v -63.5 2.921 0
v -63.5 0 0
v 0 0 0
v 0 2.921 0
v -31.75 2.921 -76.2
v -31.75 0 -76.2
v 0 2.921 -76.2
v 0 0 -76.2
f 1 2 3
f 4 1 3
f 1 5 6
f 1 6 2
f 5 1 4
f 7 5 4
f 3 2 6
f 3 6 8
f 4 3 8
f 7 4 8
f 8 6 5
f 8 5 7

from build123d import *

# Parameters (mm, degrees)
SKETCH1_W           = 304.8
SKETCH1_H           = 76.2
BOSS_EXTRUDE1_DEPTH = 3.175
CUT_EXTRUDE3_DEPTH  = 0.254
CUT_EXTRUDE5_DEPTH  = 0.254
SKETCH3_3_OUTSIDE_W = 369.64
SKETCH3_3_OUTSIDE_H = 141.04
CUT_EXTRUDE9_DEPTH  = 315.196691105


with BuildPart() as part:
    # Sketch1 → Boss-Extrude1 (new body)
    with BuildSketch(Plane(origin=(0, 0, 0), x_dir=(1, 0, 0), z_dir=(0, 1, 0))):
        with Locations((-152.4, 38.1)):
            Rectangle(SKETCH1_W, SKETCH1_H)
    extrude(amount=BOSS_EXTRUDE1_DEPTH)

    # Sketch2 → Cut-Extrude3 (cut)
    with BuildSketch(Plane(origin=(0, 3.175, 0), x_dir=(1, 0, 0), z_dir=(0, 1, 0))):
        with BuildLine():
            Line((-304.8, 5.132354223), (-304.8, 0.390438323))
            add(Edge.make_bspline(
                [(-304.8, 0.390438323), (-303.821243343, 0.22923291), (-302.632591032, 0.100235841), (-301.136713645, 0)],
                knots=[0.767987957, 0.767987957, 0.767987957, 0.767987957, 1, 1, 1, 1], degree=3))
            Line((-301.136713645, 0), (-217.379871236, 0))
            add(Edge.make_bspline(
                [(-215.9, 0.210253502), (-216.602591478, 0.075926224), (-217.379871236, 0)],
                knots=[0.882956558, 0.882956558, 0.882956558, 1, 1, 1], degree=2))
            Line((-215.9, 0.210253502), (-215.9, 6.35))
            add(Edge.make_bspline(
                [(-304.8, 5.132354223), (-295.056068779, 7.913424716), (-284.63514545, 9.175759011), (-256.65451685, 7.910717471), (-231.983718042, 8.039058457), (-215.9, 6.35)],
                knots=[0.033341876, 0.033341876, 0.033341876, 0.033341876, 0.196819423, 0.285044024, 0.915587883, 0.915587883, 0.915587883, 0.915587883], degree=3))
        make_face()
        with BuildLine():
            Line((-304.748193138, 14.319973849), (-304.748193138, 9.578057948))
            add(Edge.make_bspline(
                [(-304.748193138, 9.578057948), (-303.76943648, 9.416852535), (-302.58078417, 9.287855466), (-301.084906782, 9.187619625)],
                knots=[0.767987957, 0.767987957, 0.767987957, 0.767987957, 1, 1, 1, 1], degree=3))
            Line((-301.084906782, 9.187619625), (-217.328064374, 9.187619625))
            add(Edge.make_bspline(
                [(-215.848193138, 9.397873128), (-216.550784616, 9.263545849), (-217.328064374, 9.187619625)],
                knots=[0.882956558, 0.882956558, 0.882956558, 1, 1, 1], degree=2))
            Line((-215.848193138, 9.397873128), (-215.848193138, 15.537619625))
            add(Edge.make_bspline(
                [(-304.748193138, 14.319973849), (-295.004261916, 17.101044341), (-284.583338588, 18.363378636), (-256.602709988, 17.098337097), (-231.93191118, 17.226678082), (-215.848193138, 15.537619625)],
                knots=[0.033341876, 0.033341876, 0.033341876, 0.033341876, 0.196819423, 0.285044024, 0.915587883, 0.915587883, 0.915587883, 0.915587883], degree=3))
        make_face()
        with BuildLine():
            Line((-304.77561062, 23.435546339), (-304.77561062, 18.693630439))
            add(Edge.make_bspline(
                [(-304.77561062, 18.693630439), (-303.796853962, 18.532425025), (-302.608201652, 18.403427957), (-301.112324264, 18.303192116)],
                knots=[0.767987957, 0.767987957, 0.767987957, 0.767987957, 1, 1, 1, 1], degree=3))
            Line((-301.112324264, 18.303192116), (-217.355481855, 18.303192116))
            add(Edge.make_bspline(
                [(-215.87561062, 18.513445618), (-216.578202097, 18.37911834), (-217.355481855, 18.303192116)],
                knots=[0.882956558, 0.882956558, 0.882956558, 1, 1, 1], degree=2))
            Line((-215.87561062, 18.513445618), (-215.87561062, 24.653192116))
            add(Edge.make_bspline(
                [(-304.77561062, 23.435546339), (-295.031679398, 26.216616832), (-284.61075607, 27.478951126), (-256.63012747, 26.213909587), (-231.959328661, 26.342250572), (-215.87561062, 24.653192116)],
                knots=[0.033341876, 0.033341876, 0.033341876, 0.033341876, 0.196819423, 0.285044024, 0.915587883, 0.915587883, 0.915587883, 0.915587883], degree=3))
        make_face()
        with BuildLine():
            Line((-304.723803757, 32.623165964), (-304.723803757, 27.881250064))
            add(Edge.make_bspline(
                [(-304.723803757, 27.881250064), (-303.7450471, 27.720044651), (-302.55639479, 27.591047582), (-301.060517402, 27.490811741)],
                knots=[0.767987957, 0.767987957, 0.767987957, 0.767987957, 1, 1, 1, 1], degree=3))
            Line((-301.060517402, 27.490811741), (-217.303674993, 27.490811741))
            add(Edge.make_bspline(
                [(-215.823803757, 27.701065244), (-216.526395235, 27.566737965), (-217.303674993, 27.490811741)],
                knots=[0.882956558, 0.882956558, 0.882956558, 1, 1, 1], degree=2))
            Line((-215.823803757, 27.701065244), (-215.823803757, 33.840811741))
            add(Edge.make_bspline(
                [(-304.723803757, 32.623165964), (-294.979872536, 35.404236457), (-284.558949208, 36.666570752), (-256.578320608, 35.401529213), (-231.907521799, 35.529870198), (-215.823803757, 33.840811741)],
                knots=[0.033341876, 0.033341876, 0.033341876, 0.033341876, 0.196819423, 0.285044024, 0.915587883, 0.915587883, 0.915587883, 0.915587883], degree=3))
        make_face()
        with BuildLine():
            Line((-304.692120731, 41.752034592), (-304.692120731, 37.010118692))
            add(Edge.make_bspline(
                [(-304.692120731, 37.010118692), (-303.713364073, 36.848913278), (-302.524711763, 36.71991621), (-301.028834375, 36.619680369)],
                knots=[0.767987957, 0.767987957, 0.767987957, 0.767987957, 1, 1, 1, 1], degree=3))
            Line((-301.028834375, 36.619680369), (-217.271991966, 36.619680369))
            add(Edge.make_bspline(
                [(-215.792120731, 36.829933871), (-216.494712209, 36.695606593), (-217.271991966, 36.619680369)],
                knots=[0.882956558, 0.882956558, 0.882956558, 1, 1, 1], degree=2))
            Line((-215.792120731, 36.829933871), (-215.792120731, 42.969680369))
            add(Edge.make_bspline(
                [(-304.692120731, 41.752034592), (-294.948189509, 44.533105085), (-284.527266181, 45.795439379), (-256.546637581, 44.53039784), (-231.875838773, 44.658738825), (-215.792120731, 42.969680369)],
                knots=[0.033341876, 0.033341876, 0.033341876, 0.033341876, 0.196819423, 0.285044024, 0.915587883, 0.915587883, 0.915587883, 0.915587883], degree=3))
        make_face()
        with BuildLine():
            Line((-304.640313869, 50.939654217), (-304.640313869, 46.197738317))
            add(Edge.make_bspline(
                [(-304.640313869, 46.197738317), (-303.661557211, 46.036532904), (-302.472904901, 45.907535835), (-300.977027513, 45.807299994)],
                knots=[0.767987957, 0.767987957, 0.767987957, 0.767987957, 1, 1, 1, 1], degree=3))
            Line((-300.977027513, 45.807299994), (-217.220185104, 45.807299994))
            add(Edge.make_bspline(
                [(-215.740313869, 46.017553497), (-216.442905346, 45.883226218), (-217.220185104, 45.807299994)],
                knots=[0.882956558, 0.882956558, 0.882956558, 1, 1, 1], degree=2))
            Line((-215.740313869, 46.017553497), (-215.740313869, 52.157299994))
            add(Edge.make_bspline(
                [(-304.640313869, 50.939654217), (-294.896382647, 53.72072471), (-284.475459319, 54.983059005), (-256.494830719, 53.718017466), (-231.82403191, 53.846358451), (-215.740313869, 52.157299994)],
                knots=[0.033341876, 0.033341876, 0.033341876, 0.033341876, 0.196819423, 0.285044024, 0.915587883, 0.915587883, 0.915587883, 0.915587883], degree=3))
        make_face()
        with BuildLine():
            Line((-304.66773135, 60.055226708), (-304.66773135, 55.313310807))
            add(Edge.make_bspline(
                [(-304.66773135, 55.313310807), (-303.688974693, 55.152105394), (-302.500322383, 55.023108326), (-301.004444995, 54.922872485)],
                knots=[0.767987957, 0.767987957, 0.767987957, 0.767987957, 1, 1, 1, 1], degree=3))
            Line((-301.004444995, 54.922872485), (-217.247602586, 54.922872485))
            add(Edge.make_bspline(
                [(-215.76773135, 55.133125987), (-216.470322828, 54.998798708), (-217.247602586, 54.922872485)],
                knots=[0.882956558, 0.882956558, 0.882956558, 1, 1, 1], degree=2))
            Line((-215.76773135, 55.133125987), (-215.76773135, 61.272872485))
            add(Edge.make_bspline(
                [(-304.66773135, 60.055226708), (-294.923800129, 62.836297201), (-284.502876801, 64.098631495), (-256.522248201, 62.833589956), (-231.851449392, 62.961930941), (-215.76773135, 61.272872485)],
                knots=[0.033341876, 0.033341876, 0.033341876, 0.033341876, 0.196819423, 0.285044024, 0.915587883, 0.915587883, 0.915587883, 0.915587883], degree=3))
        make_face()
        with BuildLine():
            Line((-304.615924488, 69.242846333), (-304.615924488, 64.500930433))
            add(Edge.make_bspline(
                [(-304.615924488, 64.500930433), (-303.637167831, 64.33972502), (-302.448515521, 64.210727951), (-300.952638133, 64.11049211)],
                knots=[0.767987957, 0.767987957, 0.767987957, 0.767987957, 1, 1, 1, 1], degree=3))
            Line((-300.952638133, 64.11049211), (-217.195795724, 64.11049211))
            add(Edge.make_bspline(
                [(-215.715924488, 64.320745612), (-216.418515966, 64.186418334), (-217.195795724, 64.11049211)],
                knots=[0.882956558, 0.882956558, 0.882956558, 1, 1, 1], degree=2))
            Line((-215.715924488, 64.320745612), (-215.715924488, 70.46049211))
            add(Edge.make_bspline(
                [(-304.615924488, 69.242846333), (-294.871993267, 72.023916826), (-284.451069938, 73.286251121), (-256.470441339, 72.021209581), (-231.79964253, 72.149550567), (-215.715924488, 70.46049211)],
                knots=[0.033341876, 0.033341876, 0.033341876, 0.033341876, 0.196819423, 0.285044024, 0.915587883, 0.915587883, 0.915587883, 0.915587883], degree=3))
        make_face()
        with BuildLine():
            Line((-215.183865707, 5.315478387), (-215.183865707, 0.573562486))
            add(Edge.make_bspline(
                [(-215.183865707, 0.573562486), (-214.20510905, 0.412357073), (-213.01645674, 0.283360005), (-211.520579352, 0.183124164)],
                knots=[0.767987957, 0.767987957, 0.767987957, 0.767987957, 1, 1, 1, 1], degree=3))
            Line((-211.520579352, 0.183124164), (-127.763736943, 0.183124164))
            add(Edge.make_bspline(
                [(-126.283865707, 0.393377666), (-126.986457185, 0.259050387), (-127.763736943, 0.183124164)],
                knots=[0.882956558, 0.882956558, 0.882956558, 1, 1, 1], degree=2))
            Line((-126.283865707, 0.393377666), (-126.283865707, 6.533124164))
            add(Edge.make_bspline(
                [(-215.183865707, 5.315478387), (-205.439934486, 8.09654888), (-195.019011157, 9.358883174), (-167.038382558, 8.093841635), (-142.367583749, 8.22218262), (-126.283865707, 6.533124164)],
                knots=[0.033341876, 0.033341876, 0.033341876, 0.033341876, 0.196819423, 0.285044024, 0.915587883, 0.915587883, 0.915587883, 0.915587883], degree=3))
        make_face()
        with BuildLine():
            Line((-215.132058845, 14.503098012), (-215.132058845, 9.761182112))
            add(Edge.make_bspline(
                [(-215.132058845, 9.761182112), (-214.153302188, 9.599976698), (-212.964649877, 9.47097963), (-211.46877249, 9.370743789)],
                knots=[0.767987957, 0.767987957, 0.767987957, 0.767987957, 1, 1, 1, 1], degree=3))
            Line((-211.46877249, 9.370743789), (-127.711930081, 9.370743789))
            add(Edge.make_bspline(
                [(-126.232058845, 9.580997291), (-126.934650323, 9.446670013), (-127.711930081, 9.370743789)],
                knots=[0.882956558, 0.882956558, 0.882956558, 1, 1, 1], degree=2))
            Line((-126.232058845, 9.580997291), (-126.232058845, 15.720743789))
            add(Edge.make_bspline(
                [(-215.132058845, 14.503098012), (-205.388127624, 17.284168505), (-194.967204295, 18.546502799), (-166.986575695, 17.28146126), (-142.315776887, 17.409802246), (-126.232058845, 15.720743789)],
                knots=[0.033341876, 0.033341876, 0.033341876, 0.033341876, 0.196819423, 0.285044024, 0.915587883, 0.915587883, 0.915587883, 0.915587883], degree=3))
        make_face()
        with BuildLine():
            Line((-215.159476327, 23.618670503), (-215.159476327, 18.876754602))
            add(Edge.make_bspline(
                [(-215.159476327, 18.876754602), (-214.180719669, 18.715549189), (-212.992067359, 18.58655212), (-211.496189971, 18.486316279)],
                knots=[0.767987957, 0.767987957, 0.767987957, 0.767987957, 1, 1, 1, 1], degree=3))
            Line((-211.496189971, 18.486316279), (-127.739347562, 18.486316279))
            add(Edge.make_bspline(
                [(-126.259476327, 18.696569782), (-126.962067804, 18.562242503), (-127.739347562, 18.486316279)],
                knots=[0.882956558, 0.882956558, 0.882956558, 1, 1, 1], degree=2))
            Line((-126.259476327, 18.696569782), (-126.259476327, 24.836316279))
            add(Edge.make_bspline(
                [(-215.159476327, 23.618670503), (-205.415545105, 26.399740996), (-194.994621777, 27.66207529), (-167.013993177, 26.397033751), (-142.343194369, 26.525374736), (-126.259476327, 24.836316279)],
                knots=[0.033341876, 0.033341876, 0.033341876, 0.033341876, 0.196819423, 0.285044024, 0.915587883, 0.915587883, 0.915587883, 0.915587883], degree=3))
        make_face()
        with BuildLine():
            Line((-215.107669465, 32.806290128), (-215.107669465, 28.064374228))
            add(Edge.make_bspline(
                [(-215.107669465, 28.064374228), (-214.128912807, 27.903168814), (-212.940260497, 27.774171746), (-211.444383109, 27.673935905)],
                knots=[0.767987957, 0.767987957, 0.767987957, 0.767987957, 1, 1, 1, 1], degree=3))
            Line((-211.444383109, 27.673935905), (-127.6875407, 27.673935905))
            add(Edge.make_bspline(
                [(-126.207669465, 27.884189407), (-126.910260942, 27.749862129), (-127.6875407, 27.673935905)],
                knots=[0.882956558, 0.882956558, 0.882956558, 1, 1, 1], degree=2))
            Line((-126.207669465, 27.884189407), (-126.207669465, 34.023935905))
            add(Edge.make_bspline(
                [(-215.107669465, 32.806290128), (-205.363738243, 35.587360621), (-194.942814915, 36.849694915), (-166.962186315, 35.584653376), (-142.291387506, 35.712994361), (-126.207669465, 34.023935905)],
                knots=[0.033341876, 0.033341876, 0.033341876, 0.033341876, 0.196819423, 0.285044024, 0.915587883, 0.915587883, 0.915587883, 0.915587883], degree=3))
        make_face()
    extrude(amount=-CUT_EXTRUDE3_DEPTH, mode=Mode.SUBTRACT)

    # Sketch3 → Cut-Extrude5 (cut)
    with BuildSketch(Plane(origin=(0, 3.175, 0), x_dir=(1, 0, 0), z_dir=(0, 1, 0))):
        with BuildLine():
            Line((-124.773731724, 0), (-73.973731724, 0))
            Line((-73.973731724, 0), (-73.973731724, 5.715))
            add(Edge.make_bspline(
                [(-124.773731724, 5.588), (-99.390849234, 12.627627449), (-73.973731724, 5.715)],
                knots=[0, 0, 0, 1, 1, 1], degree=2))
            Line((-124.773731724, 5.588), (-124.773731724, 0))
        make_face()
        with BuildLine():
            Line((-124.666073477, 9.555243731), (-73.866073477, 9.555243731))
            Line((-73.866073477, 9.555243731), (-73.866073477, 15.270243731))
            add(Edge.make_bspline(
                [(-124.666073477, 15.143243731), (-99.282006864, 21.683704535), (-73.866073477, 15.270243731)],
                knots=[0, 0, 0, 1, 1, 1], degree=2))
            Line((-124.666073477, 15.143243731), (-124.666073477, 9.555243731))
        make_face()
        with BuildLine():
            Line((-124.604715686, 19.129476511), (-73.804715686, 19.129476511))
            Line((-73.804715686, 19.129476511), (-73.804715686, 24.844476511))
            add(Edge.make_bspline(
                [(-124.604715686, 24.717476511), (-99.220649073, 31.257937315), (-73.804715686, 24.844476511)],
                knots=[0, 0, 0, 1, 1, 1], degree=2))
            Line((-124.604715686, 24.717476511), (-124.604715686, 19.129476511))
        make_face()
        with BuildLine():
            Line((-124.495240807, 28.763265862), (-73.695240807, 28.763265862))
            Line((-73.695240807, 28.763265862), (-73.695240807, 34.478265862))
            add(Edge.make_bspline(
                [(-124.495240807, 34.351265862), (-99.111174194, 40.891726665), (-73.695240807, 34.478265862)],
                knots=[0, 0, 0, 1, 1, 1], degree=2))
            Line((-124.495240807, 34.351265862), (-124.495240807, 28.763265862))
        make_face()
        with BuildLine():
            Line((-124.385765928, 38.397055212), (-73.585765928, 38.397055212))
            Line((-73.585765928, 38.397055212), (-73.585765928, 44.112055212))
            add(Edge.make_bspline(
                [(-124.385765928, 43.985055212), (-99.001699315, 50.525516016), (-73.585765928, 44.112055212)],
                knots=[0, 0, 0, 1, 1, 1], degree=2))
            Line((-124.385765928, 43.985055212), (-124.385765928, 38.397055212))
        make_face()
        with BuildLine():
            Line((-124.166816171, 49.235068231), (-73.366816171, 49.235068231))
            Line((-73.366816171, 49.235068231), (-73.366816171, 54.950068231))
            add(Edge.make_bspline(
                [(-124.166816171, 54.823068231), (-98.782749557, 61.363529035), (-73.366816171, 54.950068231)],
                knots=[0, 0, 0, 1, 1, 1], degree=2))
            Line((-124.166816171, 54.823068231), (-124.166816171, 49.235068231))
        make_face()
        with BuildLine():
            Line((-124.138868232, 59.013713621), (-73.338868232, 59.013713621))
            Line((-73.338868232, 59.013713621), (-73.338868232, 64.728713621))
            add(Edge.make_bspline(
                [(-124.138868232, 64.601713621), (-98.754801619, 71.142174425), (-73.338868232, 64.728713621)],
                knots=[0, 0, 0, 1, 1, 1], degree=2))
            Line((-124.138868232, 64.601713621), (-124.138868232, 59.013713621))
        make_face()
        with BuildLine():
            Line((-213.669393762, 38.449060159), (-162.869393762, 38.449060159))
            Line((-162.869393762, 38.449060159), (-162.869393762, 44.164060159))
            add(Edge.make_bspline(
                [(-213.669393762, 44.037060159), (-188.285327148, 50.577520962), (-162.869393762, 44.164060159)],
                knots=[0, 0, 0, 1, 1, 1], degree=2))
            Line((-213.669393762, 44.037060159), (-213.669393762, 38.449060159))
        make_face()
        with BuildLine():
            Line((-213.513008565, 49.239638781), (-162.713008565, 49.239638781))
            Line((-162.713008565, 49.239638781), (-162.713008565, 54.954638781))
            add(Edge.make_bspline(
                [(-213.513008565, 54.827638781), (-188.128941951, 61.368099585), (-162.713008565, 54.954638781)],
                knots=[0, 0, 0, 1, 1, 1], degree=2))
            Line((-213.513008565, 54.827638781), (-213.513008565, 49.239638781))
        make_face()
        with BuildLine():
            Line((-213.20023817, 60.030217404), (-162.40023817, 60.030217404))
            Line((-162.40023817, 60.030217404), (-162.40023817, 65.745217404))
            add(Edge.make_bspline(
                [(-213.20023817, 65.618217404), (-187.816171556, 72.158678208), (-162.40023817, 65.745217404)],
                knots=[0, 0, 0, 1, 1, 1], degree=2))
            Line((-213.20023817, 65.618217404), (-213.20023817, 60.030217404))
        make_face()
        Polygon((0, 76.2), (-31.75, 76.2), (-63.5, 0), (0, 0), align=None)
    extrude(amount=-CUT_EXTRUDE5_DEPTH, mode=Mode.SUBTRACT)

    # Sketch3<3> outside → Cut-Extrude9 (cut, through all)
    with BuildSketch(Plane(origin=(0, 3.175, 0), x_dir=(1, 0, 0), z_dir=(0, 1, 0))):
        with Locations((-152.4, 38.1)):
            Rectangle(SKETCH3_3_OUTSIDE_W, SKETCH3_3_OUTSIDE_H)
        Polygon((0, 0), (0, 76.2), (-31.75, 76.2), (-63.5, 0), align=None, mode=Mode.SUBTRACT)
    extrude(amount=-CUT_EXTRUDE9_DEPTH, mode=Mode.SUBTRACT)


solid = part.part
